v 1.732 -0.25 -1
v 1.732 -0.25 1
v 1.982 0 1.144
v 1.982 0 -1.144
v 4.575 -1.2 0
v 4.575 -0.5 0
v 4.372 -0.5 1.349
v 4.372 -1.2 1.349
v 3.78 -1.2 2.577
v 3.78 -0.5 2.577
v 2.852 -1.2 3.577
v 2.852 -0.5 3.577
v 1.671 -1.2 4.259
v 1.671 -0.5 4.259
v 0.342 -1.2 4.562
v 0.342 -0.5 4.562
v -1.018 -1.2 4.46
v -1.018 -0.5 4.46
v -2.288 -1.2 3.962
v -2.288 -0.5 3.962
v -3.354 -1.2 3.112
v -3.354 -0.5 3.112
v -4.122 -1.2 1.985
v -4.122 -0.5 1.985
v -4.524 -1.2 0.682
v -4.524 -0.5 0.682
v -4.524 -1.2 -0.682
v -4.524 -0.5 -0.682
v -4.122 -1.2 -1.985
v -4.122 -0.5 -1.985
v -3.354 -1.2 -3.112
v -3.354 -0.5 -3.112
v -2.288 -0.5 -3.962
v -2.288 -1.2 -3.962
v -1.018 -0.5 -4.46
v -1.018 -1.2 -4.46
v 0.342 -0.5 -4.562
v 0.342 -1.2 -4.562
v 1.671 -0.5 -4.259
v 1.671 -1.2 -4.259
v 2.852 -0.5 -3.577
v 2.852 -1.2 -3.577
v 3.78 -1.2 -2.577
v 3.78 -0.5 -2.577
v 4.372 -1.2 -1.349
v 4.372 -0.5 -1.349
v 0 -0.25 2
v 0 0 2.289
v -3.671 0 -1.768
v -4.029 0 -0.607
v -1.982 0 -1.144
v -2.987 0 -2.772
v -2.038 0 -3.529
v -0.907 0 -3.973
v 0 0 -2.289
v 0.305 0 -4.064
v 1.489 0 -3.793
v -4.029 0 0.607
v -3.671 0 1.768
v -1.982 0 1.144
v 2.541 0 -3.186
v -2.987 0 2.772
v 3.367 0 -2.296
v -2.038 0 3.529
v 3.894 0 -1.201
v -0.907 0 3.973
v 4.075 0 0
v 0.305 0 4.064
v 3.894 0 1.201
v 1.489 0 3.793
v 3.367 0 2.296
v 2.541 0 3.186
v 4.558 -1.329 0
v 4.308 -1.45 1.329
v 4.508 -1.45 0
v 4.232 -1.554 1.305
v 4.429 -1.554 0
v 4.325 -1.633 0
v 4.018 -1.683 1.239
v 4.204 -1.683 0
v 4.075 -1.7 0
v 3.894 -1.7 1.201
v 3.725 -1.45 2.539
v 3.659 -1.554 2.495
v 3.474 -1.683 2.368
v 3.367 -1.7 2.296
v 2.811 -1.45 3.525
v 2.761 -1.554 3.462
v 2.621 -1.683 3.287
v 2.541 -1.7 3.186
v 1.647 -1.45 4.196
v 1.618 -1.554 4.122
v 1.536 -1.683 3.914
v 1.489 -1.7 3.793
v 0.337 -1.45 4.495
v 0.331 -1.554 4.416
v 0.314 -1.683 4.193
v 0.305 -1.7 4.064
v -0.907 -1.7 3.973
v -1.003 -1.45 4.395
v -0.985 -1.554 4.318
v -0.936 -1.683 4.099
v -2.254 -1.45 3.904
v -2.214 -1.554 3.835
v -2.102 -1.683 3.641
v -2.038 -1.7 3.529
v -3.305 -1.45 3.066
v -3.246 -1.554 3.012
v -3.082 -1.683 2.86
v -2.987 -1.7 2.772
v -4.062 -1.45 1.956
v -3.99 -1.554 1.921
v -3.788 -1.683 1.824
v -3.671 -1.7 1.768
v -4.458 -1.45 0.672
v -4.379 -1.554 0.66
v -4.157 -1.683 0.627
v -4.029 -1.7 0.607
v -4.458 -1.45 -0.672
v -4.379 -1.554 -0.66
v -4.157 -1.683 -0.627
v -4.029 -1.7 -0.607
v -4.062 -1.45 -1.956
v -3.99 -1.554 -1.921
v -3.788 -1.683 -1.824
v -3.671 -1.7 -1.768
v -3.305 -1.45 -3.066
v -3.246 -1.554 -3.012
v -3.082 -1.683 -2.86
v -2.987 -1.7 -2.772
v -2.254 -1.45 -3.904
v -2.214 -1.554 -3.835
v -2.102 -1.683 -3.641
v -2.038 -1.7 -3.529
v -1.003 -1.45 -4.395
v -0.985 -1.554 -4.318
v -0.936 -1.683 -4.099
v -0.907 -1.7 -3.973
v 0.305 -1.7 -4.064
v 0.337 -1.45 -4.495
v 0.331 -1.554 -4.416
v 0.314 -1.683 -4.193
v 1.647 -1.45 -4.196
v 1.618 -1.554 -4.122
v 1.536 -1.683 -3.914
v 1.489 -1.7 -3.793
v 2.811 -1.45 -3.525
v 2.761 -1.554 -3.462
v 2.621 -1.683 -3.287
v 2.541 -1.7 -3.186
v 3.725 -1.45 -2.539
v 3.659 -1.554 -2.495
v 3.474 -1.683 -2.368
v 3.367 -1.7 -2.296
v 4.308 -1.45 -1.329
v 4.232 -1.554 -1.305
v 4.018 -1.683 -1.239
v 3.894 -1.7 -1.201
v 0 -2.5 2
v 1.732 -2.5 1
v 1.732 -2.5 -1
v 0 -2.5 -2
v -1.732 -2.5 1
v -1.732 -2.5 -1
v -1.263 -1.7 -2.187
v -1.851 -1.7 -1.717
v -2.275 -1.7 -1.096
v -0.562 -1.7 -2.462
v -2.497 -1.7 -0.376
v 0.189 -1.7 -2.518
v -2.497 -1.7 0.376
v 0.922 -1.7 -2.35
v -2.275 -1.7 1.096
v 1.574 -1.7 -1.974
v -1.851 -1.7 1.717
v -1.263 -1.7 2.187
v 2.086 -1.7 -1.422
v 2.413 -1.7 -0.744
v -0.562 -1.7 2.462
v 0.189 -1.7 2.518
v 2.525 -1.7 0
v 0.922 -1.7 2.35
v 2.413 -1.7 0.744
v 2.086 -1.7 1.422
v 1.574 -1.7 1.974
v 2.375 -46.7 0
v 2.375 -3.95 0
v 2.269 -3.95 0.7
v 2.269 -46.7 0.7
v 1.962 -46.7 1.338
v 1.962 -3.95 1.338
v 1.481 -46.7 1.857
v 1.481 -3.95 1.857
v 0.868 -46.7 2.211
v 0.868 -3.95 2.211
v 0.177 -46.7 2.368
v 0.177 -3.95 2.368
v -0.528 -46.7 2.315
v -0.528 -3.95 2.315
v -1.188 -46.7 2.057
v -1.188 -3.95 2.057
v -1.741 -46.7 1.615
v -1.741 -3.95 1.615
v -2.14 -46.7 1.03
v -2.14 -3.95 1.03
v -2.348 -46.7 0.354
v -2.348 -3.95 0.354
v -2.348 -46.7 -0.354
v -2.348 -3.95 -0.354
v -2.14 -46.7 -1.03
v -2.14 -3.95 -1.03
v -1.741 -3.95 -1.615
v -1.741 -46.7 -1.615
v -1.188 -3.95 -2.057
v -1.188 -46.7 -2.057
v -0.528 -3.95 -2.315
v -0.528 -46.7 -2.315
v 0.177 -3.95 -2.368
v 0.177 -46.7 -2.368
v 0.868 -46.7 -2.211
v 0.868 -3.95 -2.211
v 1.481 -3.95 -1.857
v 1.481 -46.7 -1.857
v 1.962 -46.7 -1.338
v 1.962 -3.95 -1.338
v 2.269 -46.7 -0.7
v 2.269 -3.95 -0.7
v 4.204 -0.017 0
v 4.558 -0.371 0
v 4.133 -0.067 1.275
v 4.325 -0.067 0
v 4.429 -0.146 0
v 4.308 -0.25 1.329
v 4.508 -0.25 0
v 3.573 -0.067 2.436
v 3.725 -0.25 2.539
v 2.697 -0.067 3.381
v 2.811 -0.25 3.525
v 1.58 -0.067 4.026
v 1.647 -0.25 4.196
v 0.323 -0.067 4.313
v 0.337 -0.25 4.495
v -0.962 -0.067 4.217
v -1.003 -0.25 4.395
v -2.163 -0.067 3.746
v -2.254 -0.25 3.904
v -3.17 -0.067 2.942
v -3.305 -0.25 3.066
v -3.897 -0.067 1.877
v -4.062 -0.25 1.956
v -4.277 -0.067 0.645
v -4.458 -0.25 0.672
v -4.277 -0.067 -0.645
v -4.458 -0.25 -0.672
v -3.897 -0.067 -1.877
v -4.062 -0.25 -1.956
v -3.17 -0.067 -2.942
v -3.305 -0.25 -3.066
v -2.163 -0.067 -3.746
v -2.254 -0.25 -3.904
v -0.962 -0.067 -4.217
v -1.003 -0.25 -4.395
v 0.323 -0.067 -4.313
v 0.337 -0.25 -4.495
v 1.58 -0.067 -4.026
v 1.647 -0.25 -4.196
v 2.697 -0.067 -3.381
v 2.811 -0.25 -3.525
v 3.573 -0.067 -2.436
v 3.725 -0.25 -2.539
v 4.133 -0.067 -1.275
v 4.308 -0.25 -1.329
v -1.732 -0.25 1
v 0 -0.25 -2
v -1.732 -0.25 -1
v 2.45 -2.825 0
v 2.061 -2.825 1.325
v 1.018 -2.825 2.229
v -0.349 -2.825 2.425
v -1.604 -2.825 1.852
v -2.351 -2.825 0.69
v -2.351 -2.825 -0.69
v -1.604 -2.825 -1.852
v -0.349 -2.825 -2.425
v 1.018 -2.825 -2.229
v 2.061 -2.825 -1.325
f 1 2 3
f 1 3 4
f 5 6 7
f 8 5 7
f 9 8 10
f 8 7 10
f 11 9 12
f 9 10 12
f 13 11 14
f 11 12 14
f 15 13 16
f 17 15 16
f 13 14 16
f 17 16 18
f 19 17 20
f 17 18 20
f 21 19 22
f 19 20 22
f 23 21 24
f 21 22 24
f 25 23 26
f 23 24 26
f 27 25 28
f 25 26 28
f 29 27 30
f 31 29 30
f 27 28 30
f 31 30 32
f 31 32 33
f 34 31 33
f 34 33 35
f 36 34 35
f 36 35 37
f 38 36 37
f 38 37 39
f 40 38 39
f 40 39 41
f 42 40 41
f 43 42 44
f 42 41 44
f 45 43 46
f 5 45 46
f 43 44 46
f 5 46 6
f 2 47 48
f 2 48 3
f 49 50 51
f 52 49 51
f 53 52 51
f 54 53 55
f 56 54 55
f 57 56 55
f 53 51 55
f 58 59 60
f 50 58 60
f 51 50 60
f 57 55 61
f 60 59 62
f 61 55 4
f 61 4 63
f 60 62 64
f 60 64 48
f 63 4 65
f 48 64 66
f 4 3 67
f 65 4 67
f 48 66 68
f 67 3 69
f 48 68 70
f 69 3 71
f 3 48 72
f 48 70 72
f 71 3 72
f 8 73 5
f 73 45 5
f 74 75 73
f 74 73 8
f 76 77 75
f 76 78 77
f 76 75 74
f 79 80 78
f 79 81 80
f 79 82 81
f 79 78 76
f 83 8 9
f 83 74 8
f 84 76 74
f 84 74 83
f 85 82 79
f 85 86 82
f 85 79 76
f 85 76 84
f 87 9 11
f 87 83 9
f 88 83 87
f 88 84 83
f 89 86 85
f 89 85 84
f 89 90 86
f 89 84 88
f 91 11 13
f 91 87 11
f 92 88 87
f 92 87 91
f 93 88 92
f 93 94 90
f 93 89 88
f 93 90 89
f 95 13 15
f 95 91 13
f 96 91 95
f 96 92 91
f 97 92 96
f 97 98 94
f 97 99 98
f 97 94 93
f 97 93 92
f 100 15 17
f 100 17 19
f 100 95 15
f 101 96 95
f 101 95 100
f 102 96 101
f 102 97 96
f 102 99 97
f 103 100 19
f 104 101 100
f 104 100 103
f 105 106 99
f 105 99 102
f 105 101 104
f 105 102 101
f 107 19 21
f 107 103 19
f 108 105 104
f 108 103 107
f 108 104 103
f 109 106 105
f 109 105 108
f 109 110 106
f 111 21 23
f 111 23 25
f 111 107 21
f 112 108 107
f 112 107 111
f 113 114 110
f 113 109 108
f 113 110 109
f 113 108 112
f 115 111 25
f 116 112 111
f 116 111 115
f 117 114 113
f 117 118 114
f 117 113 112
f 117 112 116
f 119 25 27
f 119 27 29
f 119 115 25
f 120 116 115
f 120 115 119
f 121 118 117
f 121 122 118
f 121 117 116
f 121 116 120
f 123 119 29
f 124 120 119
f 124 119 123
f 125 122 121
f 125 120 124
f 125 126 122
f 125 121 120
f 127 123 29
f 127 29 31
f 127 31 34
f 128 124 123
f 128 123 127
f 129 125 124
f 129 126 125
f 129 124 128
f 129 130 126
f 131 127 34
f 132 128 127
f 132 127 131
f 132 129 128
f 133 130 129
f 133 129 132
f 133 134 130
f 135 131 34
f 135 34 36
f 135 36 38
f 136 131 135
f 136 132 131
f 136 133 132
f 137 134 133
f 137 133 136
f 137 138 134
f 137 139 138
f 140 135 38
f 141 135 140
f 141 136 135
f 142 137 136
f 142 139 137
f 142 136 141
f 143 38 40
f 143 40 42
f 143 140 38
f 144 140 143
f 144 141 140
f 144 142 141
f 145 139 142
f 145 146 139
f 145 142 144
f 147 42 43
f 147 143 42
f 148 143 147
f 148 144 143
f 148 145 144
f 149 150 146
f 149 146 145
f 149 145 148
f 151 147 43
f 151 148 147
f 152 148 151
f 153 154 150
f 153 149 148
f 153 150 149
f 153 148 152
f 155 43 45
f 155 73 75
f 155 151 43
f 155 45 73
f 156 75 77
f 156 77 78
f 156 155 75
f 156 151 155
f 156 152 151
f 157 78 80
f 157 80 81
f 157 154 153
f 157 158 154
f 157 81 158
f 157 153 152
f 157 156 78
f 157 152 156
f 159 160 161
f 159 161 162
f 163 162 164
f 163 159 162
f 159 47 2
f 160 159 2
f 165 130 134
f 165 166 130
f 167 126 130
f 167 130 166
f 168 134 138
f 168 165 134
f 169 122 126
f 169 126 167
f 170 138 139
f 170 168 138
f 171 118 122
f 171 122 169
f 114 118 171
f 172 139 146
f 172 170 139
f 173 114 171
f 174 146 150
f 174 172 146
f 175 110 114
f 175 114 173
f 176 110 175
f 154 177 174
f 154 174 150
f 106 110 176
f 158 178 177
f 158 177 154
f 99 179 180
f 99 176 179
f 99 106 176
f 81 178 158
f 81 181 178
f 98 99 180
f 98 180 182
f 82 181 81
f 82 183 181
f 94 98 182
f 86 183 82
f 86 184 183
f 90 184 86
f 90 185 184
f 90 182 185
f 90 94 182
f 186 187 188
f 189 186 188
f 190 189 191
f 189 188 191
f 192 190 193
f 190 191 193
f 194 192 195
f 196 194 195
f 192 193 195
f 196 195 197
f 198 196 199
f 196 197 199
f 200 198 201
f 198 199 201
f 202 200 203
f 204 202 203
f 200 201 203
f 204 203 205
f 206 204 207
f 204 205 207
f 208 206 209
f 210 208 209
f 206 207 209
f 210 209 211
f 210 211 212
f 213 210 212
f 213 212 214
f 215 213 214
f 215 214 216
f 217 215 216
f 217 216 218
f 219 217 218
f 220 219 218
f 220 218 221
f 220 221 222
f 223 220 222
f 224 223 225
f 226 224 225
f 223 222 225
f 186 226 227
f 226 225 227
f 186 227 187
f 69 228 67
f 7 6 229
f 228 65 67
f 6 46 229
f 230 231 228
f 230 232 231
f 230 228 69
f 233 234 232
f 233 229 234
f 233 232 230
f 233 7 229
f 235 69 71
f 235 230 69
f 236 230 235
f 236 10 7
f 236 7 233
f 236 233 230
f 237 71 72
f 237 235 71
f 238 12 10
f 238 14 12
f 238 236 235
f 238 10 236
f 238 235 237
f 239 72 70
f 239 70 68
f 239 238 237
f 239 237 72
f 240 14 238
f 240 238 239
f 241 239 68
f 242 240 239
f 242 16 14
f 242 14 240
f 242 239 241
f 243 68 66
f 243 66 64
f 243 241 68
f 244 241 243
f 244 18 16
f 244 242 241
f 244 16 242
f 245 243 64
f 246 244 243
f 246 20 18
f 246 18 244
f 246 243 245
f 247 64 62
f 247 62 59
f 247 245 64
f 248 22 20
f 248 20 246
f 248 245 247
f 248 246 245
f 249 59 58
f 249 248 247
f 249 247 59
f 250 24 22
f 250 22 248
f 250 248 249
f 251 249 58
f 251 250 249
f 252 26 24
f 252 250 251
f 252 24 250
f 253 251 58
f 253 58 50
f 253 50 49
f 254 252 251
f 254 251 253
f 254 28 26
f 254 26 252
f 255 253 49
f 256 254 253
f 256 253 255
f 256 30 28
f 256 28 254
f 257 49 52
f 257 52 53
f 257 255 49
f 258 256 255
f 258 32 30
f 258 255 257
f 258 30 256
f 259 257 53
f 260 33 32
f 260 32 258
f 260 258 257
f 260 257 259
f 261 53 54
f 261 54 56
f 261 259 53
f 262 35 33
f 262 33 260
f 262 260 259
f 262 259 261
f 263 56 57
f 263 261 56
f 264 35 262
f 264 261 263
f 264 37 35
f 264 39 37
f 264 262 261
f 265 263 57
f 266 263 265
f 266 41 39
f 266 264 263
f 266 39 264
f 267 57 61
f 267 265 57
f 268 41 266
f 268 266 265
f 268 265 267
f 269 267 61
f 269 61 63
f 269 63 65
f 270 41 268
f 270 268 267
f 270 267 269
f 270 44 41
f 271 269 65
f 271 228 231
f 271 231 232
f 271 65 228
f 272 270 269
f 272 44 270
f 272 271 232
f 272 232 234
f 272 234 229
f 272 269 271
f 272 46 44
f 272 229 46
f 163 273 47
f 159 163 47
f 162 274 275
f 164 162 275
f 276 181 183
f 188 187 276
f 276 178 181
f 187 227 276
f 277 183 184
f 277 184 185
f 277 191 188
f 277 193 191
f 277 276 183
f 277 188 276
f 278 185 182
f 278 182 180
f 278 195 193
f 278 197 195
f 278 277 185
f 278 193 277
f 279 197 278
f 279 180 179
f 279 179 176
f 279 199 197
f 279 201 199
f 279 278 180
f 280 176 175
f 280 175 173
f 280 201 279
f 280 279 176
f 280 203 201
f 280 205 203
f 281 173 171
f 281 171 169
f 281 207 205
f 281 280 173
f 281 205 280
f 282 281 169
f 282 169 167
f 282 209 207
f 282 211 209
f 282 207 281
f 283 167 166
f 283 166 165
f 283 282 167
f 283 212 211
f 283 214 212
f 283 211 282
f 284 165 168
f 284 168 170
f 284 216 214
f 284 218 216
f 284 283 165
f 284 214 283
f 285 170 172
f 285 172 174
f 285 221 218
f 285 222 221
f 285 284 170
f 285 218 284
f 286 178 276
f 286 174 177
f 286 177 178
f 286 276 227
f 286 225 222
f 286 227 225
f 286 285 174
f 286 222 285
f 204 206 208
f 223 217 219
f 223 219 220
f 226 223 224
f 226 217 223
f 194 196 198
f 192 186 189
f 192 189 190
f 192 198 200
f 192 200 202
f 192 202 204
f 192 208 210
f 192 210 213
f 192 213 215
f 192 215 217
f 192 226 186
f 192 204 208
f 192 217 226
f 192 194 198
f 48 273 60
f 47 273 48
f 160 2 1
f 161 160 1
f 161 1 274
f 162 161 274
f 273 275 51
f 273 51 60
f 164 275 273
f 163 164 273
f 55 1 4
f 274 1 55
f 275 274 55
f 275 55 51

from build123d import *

# Parameters (mm, degrees)
SKETCH_R        = 4.575
PAD_DEPTH       = 1.7
SKETCH001_R     = 2.375
PAD001_DEPTH    = 45
CHAMFER_SIZE2   = 2.25
CHAMFER_SIZE    = 0.15
POCKET_DEPTH    = 2.5
CHAMFER001_SIZE = 0.25
FILLET_R        = 0.5


with BuildPart() as part:
    # Sketch → Pad (new body)
    with BuildSketch(Plane.XZ):
        Circle(SKETCH_R)
    extrude(amount=PAD_DEPTH)

    # Sketch001 (on Face3 of Pad) → Pad001 (join)
    with BuildSketch(Plane.XZ.offset(1.7)):
        Circle(SKETCH001_R)
    extrude(amount=PAD001_DEPTH)

    # Chamfer
    chamfer_edges = [part.edges().sort_by_distance(p)[0] for p in [
        (-2.375, -1.7, 0),
    ]]
    chamfer_side = part.faces().sort_by_distance((-4.445599, -1.7, 0))[0]
    chamfer(chamfer_edges, length=CHAMFER_SIZE, length2=CHAMFER_SIZE2, reference=chamfer_side)

    # Sketch002 (on Face5 of Chamfer) → Pocket (cut)
    with BuildSketch(Plane(origin=(0, 0, 0), x_dir=(-1, 0, 0), z_dir=(0, 1, 0))):
        Polygon((1.732051, 1), (0, 2), (-1.732051, 1), (-1.732051, -1), (0, -2), (1.732051, -1), align=None)
    extrude(amount=-POCKET_DEPTH, mode=Mode.SUBTRACT)

    # Chamfer001
    chamfer001_edges = [part.edges().sort_by_distance(p)[0] for p in [
        (-1.732051, 0, 0),
        (-0.866025, 0, 1.5),
        (0.866025, 0, 1.5),
        (1.732051, 0, 0),
        (0.866025, 0, -1.5),
        (-0.866025, 0, -1.5),
    ]]
    chamfer(chamfer001_edges, length=CHAMFER001_SIZE)

    # Fillet
    fillet_edges = [part.edges().sort_by_distance(p)[0] for p in [
        (4.575, -0.85, 0),
        (-4.575, 0, 0),
        (-4.575, -1.7, 0),
    ]]
    fillet(fillet_edges, radius=FILLET_R)


solid = part.part
